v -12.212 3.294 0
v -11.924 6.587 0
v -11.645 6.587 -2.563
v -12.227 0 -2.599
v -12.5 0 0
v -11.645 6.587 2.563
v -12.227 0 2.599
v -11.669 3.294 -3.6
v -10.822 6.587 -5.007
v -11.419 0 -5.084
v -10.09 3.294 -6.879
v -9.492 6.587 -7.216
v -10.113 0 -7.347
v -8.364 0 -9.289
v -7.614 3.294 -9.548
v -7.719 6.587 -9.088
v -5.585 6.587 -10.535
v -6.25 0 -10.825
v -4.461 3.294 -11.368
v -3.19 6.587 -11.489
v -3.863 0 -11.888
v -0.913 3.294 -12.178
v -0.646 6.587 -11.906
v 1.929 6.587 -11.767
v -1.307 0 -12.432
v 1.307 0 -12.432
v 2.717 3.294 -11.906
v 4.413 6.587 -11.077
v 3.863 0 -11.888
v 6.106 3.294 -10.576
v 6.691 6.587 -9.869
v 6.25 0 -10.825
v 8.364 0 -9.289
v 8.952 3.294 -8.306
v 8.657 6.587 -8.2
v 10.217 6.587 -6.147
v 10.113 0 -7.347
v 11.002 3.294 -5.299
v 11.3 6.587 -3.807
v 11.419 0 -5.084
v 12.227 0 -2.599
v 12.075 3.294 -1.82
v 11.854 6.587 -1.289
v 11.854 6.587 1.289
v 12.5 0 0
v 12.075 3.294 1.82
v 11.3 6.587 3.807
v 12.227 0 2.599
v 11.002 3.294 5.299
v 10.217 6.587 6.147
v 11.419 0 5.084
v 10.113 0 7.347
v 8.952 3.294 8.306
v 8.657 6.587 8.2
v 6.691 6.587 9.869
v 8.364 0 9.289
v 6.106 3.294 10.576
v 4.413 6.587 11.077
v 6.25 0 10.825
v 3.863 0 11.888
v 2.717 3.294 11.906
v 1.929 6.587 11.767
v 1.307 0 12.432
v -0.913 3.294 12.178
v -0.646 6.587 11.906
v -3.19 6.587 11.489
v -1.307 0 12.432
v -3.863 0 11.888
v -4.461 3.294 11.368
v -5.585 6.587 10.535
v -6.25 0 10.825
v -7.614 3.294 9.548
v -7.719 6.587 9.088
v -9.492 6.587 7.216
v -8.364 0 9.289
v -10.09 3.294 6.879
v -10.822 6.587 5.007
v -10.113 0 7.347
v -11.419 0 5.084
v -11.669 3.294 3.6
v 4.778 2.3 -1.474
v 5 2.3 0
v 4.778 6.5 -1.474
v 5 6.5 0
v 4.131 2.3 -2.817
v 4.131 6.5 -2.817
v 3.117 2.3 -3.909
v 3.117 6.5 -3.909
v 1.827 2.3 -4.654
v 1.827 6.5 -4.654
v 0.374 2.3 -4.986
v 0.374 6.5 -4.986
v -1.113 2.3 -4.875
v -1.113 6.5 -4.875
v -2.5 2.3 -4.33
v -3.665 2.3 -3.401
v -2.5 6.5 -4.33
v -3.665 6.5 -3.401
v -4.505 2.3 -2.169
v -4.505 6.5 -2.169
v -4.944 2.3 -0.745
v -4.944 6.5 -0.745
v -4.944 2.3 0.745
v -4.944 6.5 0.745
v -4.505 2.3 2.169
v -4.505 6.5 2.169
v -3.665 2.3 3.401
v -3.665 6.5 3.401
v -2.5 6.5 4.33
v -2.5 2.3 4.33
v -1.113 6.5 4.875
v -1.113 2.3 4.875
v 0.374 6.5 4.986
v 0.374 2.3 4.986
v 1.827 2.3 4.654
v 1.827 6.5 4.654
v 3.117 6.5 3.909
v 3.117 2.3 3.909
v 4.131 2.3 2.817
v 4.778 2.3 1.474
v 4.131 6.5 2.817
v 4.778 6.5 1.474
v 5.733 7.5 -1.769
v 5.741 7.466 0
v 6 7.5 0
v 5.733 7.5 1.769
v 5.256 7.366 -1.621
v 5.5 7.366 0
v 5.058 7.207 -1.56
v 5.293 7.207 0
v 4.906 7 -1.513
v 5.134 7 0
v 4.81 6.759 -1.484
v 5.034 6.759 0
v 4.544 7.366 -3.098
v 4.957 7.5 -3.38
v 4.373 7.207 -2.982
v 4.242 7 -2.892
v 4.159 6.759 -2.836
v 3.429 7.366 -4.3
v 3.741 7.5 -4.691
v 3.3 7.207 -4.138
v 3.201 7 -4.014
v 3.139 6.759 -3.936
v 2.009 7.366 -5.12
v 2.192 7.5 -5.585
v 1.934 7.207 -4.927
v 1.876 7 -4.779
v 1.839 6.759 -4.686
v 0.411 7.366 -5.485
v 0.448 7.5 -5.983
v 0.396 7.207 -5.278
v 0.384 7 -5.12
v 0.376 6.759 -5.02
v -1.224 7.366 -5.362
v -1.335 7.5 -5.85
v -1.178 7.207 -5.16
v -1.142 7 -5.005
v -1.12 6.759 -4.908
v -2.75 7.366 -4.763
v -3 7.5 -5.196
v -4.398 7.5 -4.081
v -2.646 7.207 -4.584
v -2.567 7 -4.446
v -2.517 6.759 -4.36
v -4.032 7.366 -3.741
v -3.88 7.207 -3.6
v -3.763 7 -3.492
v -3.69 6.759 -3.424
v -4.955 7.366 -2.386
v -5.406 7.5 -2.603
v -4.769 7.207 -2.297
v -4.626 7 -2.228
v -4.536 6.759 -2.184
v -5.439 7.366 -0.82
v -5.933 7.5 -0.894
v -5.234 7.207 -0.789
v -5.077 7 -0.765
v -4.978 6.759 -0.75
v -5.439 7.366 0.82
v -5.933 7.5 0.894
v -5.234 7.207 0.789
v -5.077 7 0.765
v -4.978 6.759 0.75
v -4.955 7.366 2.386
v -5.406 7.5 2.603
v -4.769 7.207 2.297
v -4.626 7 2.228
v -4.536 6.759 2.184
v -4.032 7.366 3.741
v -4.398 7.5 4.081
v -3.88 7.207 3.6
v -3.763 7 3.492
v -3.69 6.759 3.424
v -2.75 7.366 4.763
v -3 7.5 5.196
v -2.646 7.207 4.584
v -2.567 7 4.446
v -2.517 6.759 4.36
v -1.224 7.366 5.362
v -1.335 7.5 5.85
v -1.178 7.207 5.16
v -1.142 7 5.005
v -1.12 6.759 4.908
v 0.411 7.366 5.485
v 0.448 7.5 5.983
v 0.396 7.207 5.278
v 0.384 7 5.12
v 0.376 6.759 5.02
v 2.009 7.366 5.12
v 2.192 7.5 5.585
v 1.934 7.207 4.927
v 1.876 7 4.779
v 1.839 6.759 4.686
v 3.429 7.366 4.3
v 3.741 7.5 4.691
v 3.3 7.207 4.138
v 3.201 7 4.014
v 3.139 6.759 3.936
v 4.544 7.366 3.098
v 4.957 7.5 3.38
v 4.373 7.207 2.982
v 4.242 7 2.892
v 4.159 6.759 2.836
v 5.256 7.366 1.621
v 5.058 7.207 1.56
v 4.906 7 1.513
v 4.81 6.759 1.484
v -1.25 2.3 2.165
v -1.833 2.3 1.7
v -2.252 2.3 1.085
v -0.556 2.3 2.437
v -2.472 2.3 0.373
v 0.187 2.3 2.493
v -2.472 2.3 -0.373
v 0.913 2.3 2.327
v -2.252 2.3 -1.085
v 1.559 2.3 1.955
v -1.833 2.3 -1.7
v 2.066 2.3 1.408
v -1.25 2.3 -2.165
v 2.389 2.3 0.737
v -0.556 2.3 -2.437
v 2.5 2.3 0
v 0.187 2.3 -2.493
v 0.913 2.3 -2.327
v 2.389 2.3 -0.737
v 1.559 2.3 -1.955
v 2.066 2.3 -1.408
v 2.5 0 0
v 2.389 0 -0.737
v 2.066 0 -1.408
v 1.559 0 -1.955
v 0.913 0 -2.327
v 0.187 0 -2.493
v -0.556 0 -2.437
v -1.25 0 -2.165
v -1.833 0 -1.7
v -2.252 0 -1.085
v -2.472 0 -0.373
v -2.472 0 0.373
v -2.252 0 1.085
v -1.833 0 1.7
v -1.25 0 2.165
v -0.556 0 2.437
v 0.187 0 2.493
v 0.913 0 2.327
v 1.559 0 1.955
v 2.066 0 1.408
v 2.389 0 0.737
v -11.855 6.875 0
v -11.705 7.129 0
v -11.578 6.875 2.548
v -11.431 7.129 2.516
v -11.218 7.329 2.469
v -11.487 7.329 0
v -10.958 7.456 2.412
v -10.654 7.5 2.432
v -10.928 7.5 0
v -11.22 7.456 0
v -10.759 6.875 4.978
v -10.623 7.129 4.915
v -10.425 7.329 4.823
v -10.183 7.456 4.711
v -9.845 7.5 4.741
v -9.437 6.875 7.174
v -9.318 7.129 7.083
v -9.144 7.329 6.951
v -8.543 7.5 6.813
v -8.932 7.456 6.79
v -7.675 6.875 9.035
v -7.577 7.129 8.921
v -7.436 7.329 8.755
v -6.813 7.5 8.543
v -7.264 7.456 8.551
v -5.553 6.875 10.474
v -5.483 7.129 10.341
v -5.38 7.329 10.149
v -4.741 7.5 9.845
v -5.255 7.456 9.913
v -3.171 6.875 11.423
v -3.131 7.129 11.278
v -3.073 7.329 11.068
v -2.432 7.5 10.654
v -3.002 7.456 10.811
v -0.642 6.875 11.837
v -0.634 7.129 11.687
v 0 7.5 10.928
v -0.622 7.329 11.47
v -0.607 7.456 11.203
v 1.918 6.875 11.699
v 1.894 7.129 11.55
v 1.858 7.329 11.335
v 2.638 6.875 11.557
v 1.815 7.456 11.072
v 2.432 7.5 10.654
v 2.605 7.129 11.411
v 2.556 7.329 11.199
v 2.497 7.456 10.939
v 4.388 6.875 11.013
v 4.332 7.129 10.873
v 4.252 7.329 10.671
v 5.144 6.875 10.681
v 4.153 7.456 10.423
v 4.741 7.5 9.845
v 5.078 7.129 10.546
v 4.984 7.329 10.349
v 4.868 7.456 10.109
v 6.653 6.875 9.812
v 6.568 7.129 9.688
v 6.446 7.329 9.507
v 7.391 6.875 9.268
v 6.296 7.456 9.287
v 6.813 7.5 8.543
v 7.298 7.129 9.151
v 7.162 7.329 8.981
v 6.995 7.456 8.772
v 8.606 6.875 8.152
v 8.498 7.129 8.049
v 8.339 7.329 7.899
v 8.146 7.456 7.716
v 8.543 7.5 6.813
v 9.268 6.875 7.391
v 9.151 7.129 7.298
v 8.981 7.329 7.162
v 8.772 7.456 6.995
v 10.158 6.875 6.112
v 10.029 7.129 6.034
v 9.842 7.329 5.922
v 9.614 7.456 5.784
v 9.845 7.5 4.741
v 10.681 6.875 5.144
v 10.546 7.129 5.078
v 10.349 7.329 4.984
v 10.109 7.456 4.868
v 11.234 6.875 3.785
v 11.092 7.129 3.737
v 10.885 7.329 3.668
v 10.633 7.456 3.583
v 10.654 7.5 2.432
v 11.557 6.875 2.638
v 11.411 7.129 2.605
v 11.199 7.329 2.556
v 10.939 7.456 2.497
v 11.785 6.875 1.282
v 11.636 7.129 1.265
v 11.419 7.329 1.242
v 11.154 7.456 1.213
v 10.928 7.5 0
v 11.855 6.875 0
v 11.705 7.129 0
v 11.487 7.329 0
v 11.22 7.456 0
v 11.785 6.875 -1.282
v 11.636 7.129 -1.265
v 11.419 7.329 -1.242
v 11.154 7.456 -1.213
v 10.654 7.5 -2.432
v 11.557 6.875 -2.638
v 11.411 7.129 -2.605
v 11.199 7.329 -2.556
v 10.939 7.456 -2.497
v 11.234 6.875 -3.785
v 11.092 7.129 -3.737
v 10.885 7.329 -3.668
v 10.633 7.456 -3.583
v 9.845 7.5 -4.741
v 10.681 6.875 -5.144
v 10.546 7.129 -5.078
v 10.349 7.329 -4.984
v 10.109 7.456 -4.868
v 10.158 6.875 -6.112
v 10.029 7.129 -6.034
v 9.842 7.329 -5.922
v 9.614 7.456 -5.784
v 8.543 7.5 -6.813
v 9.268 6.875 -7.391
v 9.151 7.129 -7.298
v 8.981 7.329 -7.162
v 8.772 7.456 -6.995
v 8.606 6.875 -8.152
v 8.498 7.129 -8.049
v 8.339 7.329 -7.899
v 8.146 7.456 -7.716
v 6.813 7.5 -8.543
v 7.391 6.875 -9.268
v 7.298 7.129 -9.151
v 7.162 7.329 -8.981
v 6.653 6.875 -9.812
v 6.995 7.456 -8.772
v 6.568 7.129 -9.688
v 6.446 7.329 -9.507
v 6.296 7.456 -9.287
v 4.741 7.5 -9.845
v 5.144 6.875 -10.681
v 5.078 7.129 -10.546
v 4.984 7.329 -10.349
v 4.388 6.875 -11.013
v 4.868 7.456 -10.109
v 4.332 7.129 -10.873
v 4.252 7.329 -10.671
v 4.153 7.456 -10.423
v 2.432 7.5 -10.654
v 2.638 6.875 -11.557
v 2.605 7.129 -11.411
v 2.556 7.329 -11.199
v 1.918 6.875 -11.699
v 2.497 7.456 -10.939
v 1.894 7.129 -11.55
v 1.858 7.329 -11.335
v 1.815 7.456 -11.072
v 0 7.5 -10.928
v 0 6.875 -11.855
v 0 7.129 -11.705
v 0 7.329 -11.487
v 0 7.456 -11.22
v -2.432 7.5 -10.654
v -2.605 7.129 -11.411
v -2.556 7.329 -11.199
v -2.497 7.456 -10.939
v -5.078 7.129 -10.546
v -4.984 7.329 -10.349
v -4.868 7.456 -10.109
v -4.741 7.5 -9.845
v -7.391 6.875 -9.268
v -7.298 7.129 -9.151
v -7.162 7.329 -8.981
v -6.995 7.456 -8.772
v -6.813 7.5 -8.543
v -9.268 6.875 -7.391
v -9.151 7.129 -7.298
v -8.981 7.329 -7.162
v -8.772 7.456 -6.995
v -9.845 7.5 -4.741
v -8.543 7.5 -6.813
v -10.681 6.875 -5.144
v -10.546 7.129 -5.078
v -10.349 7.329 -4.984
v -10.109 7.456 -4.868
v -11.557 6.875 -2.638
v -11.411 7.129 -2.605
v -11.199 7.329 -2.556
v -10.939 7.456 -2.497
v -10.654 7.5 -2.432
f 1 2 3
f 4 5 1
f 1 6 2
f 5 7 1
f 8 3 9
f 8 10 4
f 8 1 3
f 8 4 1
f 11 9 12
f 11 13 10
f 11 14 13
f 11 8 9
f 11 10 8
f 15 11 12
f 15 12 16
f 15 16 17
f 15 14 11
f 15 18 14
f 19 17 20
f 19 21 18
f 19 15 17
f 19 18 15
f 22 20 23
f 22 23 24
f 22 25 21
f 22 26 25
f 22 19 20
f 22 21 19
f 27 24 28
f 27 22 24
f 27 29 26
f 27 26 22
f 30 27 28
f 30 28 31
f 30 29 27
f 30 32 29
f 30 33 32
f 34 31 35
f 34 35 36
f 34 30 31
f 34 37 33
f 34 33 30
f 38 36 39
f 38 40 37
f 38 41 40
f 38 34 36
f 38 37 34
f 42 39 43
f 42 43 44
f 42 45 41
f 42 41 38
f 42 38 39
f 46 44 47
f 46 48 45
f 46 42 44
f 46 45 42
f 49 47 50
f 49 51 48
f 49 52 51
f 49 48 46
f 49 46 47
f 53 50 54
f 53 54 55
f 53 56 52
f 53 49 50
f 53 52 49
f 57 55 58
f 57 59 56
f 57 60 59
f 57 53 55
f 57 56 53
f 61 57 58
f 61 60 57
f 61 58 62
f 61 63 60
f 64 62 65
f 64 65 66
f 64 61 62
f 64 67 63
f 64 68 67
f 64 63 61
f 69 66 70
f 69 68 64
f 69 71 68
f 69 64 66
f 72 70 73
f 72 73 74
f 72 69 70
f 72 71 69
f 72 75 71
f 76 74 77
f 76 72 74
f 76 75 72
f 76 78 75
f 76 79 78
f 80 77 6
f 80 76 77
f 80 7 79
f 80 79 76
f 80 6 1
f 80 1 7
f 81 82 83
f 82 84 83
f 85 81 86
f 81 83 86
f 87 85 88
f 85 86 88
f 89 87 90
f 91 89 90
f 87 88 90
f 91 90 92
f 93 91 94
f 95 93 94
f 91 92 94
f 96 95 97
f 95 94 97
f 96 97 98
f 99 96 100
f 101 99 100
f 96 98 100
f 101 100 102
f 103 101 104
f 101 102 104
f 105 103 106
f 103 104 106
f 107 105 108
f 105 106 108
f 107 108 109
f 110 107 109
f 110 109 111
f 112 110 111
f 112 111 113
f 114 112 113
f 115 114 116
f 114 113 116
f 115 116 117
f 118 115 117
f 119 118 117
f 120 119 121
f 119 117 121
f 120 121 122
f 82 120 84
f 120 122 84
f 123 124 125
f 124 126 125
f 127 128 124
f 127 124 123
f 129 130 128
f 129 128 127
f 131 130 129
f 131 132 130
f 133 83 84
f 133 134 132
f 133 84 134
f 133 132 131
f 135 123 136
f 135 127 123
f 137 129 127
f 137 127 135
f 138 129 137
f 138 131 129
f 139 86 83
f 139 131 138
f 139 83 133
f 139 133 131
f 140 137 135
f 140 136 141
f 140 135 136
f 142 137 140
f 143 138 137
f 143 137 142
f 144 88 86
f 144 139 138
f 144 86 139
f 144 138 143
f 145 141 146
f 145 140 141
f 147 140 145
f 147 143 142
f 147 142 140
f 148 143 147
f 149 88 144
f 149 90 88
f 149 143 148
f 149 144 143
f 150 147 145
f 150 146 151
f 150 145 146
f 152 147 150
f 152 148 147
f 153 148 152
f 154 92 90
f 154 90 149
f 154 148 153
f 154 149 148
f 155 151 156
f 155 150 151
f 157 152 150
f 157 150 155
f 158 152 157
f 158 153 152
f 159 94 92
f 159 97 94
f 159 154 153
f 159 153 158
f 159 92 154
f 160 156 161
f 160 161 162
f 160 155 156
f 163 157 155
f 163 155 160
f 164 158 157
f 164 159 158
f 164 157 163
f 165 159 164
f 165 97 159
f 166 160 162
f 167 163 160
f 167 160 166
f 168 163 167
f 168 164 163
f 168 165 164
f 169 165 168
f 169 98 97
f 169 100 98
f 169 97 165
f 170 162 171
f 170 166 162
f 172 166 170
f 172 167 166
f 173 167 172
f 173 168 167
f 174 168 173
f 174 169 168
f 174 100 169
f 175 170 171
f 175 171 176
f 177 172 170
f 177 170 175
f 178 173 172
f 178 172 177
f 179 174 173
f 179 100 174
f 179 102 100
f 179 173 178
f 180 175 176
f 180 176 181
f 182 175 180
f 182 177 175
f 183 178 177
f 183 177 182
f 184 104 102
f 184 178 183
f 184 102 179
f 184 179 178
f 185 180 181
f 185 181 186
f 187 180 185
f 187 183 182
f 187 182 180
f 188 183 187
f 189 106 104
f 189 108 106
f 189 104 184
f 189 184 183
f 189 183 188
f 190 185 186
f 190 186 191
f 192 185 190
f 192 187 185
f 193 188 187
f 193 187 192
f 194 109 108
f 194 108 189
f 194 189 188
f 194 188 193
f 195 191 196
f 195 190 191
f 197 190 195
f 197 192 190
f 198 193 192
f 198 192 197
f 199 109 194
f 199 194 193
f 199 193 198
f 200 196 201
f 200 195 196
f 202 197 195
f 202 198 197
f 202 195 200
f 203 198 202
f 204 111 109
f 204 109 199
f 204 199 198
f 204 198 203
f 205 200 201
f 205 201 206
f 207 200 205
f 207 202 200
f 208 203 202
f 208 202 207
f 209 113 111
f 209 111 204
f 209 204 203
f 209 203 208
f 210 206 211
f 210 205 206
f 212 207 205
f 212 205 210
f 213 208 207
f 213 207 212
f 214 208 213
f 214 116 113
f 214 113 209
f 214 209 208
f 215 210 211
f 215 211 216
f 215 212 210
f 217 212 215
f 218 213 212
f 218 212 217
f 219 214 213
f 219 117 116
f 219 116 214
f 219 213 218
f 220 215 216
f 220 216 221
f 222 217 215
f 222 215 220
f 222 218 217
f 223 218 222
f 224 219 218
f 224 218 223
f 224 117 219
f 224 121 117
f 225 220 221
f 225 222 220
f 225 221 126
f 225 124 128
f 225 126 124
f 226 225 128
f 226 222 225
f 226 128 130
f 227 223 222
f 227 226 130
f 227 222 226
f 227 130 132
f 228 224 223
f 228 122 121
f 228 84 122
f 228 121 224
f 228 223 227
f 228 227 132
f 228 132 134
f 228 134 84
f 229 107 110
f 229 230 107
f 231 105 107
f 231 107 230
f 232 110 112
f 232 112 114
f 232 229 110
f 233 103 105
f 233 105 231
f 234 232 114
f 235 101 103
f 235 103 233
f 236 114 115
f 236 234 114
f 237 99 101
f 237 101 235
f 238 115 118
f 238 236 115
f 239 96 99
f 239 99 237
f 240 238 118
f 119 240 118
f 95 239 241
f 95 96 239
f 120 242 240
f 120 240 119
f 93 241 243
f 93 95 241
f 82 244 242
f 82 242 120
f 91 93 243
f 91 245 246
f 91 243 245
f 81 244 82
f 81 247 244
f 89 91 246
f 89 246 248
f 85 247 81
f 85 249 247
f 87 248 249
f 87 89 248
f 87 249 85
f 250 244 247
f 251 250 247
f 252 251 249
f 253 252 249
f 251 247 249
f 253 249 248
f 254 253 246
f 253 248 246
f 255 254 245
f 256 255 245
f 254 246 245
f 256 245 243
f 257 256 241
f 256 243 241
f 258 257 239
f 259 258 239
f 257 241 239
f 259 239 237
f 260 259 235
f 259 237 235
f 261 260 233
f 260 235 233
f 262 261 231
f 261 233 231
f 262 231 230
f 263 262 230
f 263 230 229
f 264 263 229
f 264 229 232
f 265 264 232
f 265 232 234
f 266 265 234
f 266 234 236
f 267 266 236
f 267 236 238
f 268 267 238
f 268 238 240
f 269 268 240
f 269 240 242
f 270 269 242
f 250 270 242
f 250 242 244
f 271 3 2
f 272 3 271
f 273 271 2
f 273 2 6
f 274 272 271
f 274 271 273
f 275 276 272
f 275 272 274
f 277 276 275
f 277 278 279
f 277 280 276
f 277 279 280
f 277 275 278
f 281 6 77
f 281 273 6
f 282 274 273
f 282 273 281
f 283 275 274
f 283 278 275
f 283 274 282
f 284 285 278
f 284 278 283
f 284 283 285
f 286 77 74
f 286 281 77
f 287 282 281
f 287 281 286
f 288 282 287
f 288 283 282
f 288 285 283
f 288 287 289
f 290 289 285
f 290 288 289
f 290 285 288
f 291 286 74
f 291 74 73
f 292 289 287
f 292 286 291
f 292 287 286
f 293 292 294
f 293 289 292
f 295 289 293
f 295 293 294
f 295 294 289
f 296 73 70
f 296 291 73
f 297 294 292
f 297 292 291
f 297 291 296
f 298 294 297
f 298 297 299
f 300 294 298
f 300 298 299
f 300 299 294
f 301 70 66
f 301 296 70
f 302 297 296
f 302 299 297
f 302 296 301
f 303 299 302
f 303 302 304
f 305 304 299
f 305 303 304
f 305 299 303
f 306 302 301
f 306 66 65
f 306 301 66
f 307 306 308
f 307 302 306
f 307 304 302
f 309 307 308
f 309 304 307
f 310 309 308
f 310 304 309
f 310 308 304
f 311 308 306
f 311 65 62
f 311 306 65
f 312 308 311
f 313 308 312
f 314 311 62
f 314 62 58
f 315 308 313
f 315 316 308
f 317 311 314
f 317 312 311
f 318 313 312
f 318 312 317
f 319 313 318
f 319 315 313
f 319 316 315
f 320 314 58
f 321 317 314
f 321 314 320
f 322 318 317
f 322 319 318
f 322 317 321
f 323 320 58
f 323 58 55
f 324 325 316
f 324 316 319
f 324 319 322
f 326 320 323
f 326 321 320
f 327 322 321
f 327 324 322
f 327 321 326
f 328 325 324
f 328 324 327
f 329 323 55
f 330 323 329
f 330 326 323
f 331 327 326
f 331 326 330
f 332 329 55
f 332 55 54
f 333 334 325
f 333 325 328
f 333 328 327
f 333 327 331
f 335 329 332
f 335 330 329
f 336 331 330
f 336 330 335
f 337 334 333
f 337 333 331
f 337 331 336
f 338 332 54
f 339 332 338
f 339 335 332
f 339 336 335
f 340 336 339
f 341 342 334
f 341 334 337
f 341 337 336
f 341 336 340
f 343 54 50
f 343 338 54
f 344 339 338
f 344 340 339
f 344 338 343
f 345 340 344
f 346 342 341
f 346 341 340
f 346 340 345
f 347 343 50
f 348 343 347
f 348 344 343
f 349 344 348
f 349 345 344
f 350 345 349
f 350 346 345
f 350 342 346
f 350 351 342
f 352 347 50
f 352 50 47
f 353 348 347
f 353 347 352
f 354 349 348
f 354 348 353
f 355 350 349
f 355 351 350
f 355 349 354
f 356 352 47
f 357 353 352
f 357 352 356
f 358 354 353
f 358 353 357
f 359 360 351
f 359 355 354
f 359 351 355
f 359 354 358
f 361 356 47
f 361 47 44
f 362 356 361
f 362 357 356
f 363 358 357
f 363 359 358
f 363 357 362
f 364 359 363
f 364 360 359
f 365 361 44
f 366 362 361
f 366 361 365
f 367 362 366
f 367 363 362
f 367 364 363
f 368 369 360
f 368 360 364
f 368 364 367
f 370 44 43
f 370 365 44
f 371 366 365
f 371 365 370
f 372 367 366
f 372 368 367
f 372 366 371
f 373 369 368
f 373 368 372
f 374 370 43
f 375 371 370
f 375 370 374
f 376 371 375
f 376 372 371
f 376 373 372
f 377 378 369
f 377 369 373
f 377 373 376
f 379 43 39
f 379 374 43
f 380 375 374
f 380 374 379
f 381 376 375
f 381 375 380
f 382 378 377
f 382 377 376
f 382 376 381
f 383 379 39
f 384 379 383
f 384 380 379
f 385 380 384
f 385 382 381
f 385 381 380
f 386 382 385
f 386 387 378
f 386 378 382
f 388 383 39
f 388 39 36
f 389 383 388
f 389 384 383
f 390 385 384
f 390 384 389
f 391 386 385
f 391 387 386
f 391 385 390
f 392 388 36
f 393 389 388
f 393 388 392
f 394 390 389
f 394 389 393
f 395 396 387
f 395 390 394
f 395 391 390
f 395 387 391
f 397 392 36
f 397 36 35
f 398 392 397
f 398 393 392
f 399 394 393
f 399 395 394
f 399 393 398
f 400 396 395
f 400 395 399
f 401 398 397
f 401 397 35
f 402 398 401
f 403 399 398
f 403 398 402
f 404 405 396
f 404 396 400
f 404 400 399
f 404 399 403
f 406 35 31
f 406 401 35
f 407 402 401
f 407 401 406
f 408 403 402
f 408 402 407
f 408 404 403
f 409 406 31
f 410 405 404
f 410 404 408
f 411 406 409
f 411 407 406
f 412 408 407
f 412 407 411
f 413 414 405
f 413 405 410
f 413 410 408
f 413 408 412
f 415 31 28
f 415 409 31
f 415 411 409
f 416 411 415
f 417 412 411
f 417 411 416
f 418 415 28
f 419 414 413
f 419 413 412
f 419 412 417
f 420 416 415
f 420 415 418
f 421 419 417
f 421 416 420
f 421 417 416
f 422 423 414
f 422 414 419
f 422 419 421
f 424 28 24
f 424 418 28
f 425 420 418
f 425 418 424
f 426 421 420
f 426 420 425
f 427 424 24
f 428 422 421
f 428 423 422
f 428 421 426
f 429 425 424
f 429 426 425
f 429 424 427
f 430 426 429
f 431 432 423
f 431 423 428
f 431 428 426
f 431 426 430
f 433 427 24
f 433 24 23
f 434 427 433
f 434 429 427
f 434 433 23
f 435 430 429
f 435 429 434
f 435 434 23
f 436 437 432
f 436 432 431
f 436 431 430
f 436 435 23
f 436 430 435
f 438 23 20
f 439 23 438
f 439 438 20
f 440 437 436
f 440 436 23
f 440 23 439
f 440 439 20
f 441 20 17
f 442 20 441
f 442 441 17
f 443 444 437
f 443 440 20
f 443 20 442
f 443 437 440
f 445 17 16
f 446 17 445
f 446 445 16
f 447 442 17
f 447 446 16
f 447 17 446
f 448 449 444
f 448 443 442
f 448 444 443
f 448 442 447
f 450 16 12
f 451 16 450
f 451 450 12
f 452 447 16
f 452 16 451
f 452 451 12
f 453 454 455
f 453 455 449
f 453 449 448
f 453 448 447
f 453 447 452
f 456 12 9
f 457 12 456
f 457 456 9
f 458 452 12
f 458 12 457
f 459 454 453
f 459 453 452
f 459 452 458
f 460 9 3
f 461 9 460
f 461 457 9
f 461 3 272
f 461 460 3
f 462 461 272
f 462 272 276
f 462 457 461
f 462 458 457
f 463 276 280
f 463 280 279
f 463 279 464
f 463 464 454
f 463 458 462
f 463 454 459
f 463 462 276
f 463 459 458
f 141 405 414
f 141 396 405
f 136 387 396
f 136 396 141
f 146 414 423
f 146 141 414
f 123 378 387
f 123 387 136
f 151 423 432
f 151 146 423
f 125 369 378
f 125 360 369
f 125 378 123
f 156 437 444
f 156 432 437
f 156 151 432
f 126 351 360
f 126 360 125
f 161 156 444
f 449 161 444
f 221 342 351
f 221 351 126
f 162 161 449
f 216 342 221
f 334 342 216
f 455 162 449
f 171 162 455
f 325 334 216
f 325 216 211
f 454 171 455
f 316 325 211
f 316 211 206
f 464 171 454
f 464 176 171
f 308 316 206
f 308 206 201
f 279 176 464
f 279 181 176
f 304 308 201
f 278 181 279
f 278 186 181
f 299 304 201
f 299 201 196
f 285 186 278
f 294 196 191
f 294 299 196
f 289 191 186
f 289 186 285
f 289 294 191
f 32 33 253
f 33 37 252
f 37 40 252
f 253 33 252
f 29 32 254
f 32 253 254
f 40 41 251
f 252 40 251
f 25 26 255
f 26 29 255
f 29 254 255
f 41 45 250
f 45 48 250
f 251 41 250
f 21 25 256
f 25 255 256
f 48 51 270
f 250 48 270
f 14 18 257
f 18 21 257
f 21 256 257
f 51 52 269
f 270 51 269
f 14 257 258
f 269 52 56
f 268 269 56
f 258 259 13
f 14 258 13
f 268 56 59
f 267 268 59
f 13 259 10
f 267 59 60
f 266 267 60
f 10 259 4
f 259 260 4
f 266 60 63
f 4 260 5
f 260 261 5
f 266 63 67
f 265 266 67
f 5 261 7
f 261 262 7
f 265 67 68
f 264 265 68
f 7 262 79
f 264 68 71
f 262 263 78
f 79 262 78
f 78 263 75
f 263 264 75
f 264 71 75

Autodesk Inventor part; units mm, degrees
ref_plane "YZ Plane" through (0, 0, 0) normal (1, 0, 0) x (0, 1, 0)
ref_plane "XZ Plane" through (0, 0, 0) normal (0, 1, 0) x (-1, 0, 0)
ref_plane "XY Plane" through (0, 0, 0) normal (0, 0, 1) x (1, 0, 0)
sketch "Boceto1" plane through (0, 0, 0) normal (0, 1, 0) x (-1, 0, 0)
  circle A0 centre (0, 0) radius 12.5
  dimension "d0" = 25
extrude "Extrusión1" add sketch "Boceto1" along normal blind 7.5 draft -5
sketch "Boceto2" plane through (0, 7.5, 0) normal (0, 1, 0) x (1, 0, 0)
  circle A0 centre (0, 0) radius 2.5
  dimension "d3" = 5
extrude "Extrusión2" cut sketch "Boceto2" against normal through all
sketch "Boceto3" plane through (0, 7.5, 0) normal (0, 1, 0) x (1, 0, 0)
  circle A0 centre (0, 0) radius 5
  dimension "d6" = 10
extrude "Extrusión3" cut sketch "Boceto3" against normal blind 5.2
fillet "Empalme1" radius 1 2 edges at (-5, 7.5, 0) (11.8438, 7.5, 0)
properties part number "RubberFoot"
